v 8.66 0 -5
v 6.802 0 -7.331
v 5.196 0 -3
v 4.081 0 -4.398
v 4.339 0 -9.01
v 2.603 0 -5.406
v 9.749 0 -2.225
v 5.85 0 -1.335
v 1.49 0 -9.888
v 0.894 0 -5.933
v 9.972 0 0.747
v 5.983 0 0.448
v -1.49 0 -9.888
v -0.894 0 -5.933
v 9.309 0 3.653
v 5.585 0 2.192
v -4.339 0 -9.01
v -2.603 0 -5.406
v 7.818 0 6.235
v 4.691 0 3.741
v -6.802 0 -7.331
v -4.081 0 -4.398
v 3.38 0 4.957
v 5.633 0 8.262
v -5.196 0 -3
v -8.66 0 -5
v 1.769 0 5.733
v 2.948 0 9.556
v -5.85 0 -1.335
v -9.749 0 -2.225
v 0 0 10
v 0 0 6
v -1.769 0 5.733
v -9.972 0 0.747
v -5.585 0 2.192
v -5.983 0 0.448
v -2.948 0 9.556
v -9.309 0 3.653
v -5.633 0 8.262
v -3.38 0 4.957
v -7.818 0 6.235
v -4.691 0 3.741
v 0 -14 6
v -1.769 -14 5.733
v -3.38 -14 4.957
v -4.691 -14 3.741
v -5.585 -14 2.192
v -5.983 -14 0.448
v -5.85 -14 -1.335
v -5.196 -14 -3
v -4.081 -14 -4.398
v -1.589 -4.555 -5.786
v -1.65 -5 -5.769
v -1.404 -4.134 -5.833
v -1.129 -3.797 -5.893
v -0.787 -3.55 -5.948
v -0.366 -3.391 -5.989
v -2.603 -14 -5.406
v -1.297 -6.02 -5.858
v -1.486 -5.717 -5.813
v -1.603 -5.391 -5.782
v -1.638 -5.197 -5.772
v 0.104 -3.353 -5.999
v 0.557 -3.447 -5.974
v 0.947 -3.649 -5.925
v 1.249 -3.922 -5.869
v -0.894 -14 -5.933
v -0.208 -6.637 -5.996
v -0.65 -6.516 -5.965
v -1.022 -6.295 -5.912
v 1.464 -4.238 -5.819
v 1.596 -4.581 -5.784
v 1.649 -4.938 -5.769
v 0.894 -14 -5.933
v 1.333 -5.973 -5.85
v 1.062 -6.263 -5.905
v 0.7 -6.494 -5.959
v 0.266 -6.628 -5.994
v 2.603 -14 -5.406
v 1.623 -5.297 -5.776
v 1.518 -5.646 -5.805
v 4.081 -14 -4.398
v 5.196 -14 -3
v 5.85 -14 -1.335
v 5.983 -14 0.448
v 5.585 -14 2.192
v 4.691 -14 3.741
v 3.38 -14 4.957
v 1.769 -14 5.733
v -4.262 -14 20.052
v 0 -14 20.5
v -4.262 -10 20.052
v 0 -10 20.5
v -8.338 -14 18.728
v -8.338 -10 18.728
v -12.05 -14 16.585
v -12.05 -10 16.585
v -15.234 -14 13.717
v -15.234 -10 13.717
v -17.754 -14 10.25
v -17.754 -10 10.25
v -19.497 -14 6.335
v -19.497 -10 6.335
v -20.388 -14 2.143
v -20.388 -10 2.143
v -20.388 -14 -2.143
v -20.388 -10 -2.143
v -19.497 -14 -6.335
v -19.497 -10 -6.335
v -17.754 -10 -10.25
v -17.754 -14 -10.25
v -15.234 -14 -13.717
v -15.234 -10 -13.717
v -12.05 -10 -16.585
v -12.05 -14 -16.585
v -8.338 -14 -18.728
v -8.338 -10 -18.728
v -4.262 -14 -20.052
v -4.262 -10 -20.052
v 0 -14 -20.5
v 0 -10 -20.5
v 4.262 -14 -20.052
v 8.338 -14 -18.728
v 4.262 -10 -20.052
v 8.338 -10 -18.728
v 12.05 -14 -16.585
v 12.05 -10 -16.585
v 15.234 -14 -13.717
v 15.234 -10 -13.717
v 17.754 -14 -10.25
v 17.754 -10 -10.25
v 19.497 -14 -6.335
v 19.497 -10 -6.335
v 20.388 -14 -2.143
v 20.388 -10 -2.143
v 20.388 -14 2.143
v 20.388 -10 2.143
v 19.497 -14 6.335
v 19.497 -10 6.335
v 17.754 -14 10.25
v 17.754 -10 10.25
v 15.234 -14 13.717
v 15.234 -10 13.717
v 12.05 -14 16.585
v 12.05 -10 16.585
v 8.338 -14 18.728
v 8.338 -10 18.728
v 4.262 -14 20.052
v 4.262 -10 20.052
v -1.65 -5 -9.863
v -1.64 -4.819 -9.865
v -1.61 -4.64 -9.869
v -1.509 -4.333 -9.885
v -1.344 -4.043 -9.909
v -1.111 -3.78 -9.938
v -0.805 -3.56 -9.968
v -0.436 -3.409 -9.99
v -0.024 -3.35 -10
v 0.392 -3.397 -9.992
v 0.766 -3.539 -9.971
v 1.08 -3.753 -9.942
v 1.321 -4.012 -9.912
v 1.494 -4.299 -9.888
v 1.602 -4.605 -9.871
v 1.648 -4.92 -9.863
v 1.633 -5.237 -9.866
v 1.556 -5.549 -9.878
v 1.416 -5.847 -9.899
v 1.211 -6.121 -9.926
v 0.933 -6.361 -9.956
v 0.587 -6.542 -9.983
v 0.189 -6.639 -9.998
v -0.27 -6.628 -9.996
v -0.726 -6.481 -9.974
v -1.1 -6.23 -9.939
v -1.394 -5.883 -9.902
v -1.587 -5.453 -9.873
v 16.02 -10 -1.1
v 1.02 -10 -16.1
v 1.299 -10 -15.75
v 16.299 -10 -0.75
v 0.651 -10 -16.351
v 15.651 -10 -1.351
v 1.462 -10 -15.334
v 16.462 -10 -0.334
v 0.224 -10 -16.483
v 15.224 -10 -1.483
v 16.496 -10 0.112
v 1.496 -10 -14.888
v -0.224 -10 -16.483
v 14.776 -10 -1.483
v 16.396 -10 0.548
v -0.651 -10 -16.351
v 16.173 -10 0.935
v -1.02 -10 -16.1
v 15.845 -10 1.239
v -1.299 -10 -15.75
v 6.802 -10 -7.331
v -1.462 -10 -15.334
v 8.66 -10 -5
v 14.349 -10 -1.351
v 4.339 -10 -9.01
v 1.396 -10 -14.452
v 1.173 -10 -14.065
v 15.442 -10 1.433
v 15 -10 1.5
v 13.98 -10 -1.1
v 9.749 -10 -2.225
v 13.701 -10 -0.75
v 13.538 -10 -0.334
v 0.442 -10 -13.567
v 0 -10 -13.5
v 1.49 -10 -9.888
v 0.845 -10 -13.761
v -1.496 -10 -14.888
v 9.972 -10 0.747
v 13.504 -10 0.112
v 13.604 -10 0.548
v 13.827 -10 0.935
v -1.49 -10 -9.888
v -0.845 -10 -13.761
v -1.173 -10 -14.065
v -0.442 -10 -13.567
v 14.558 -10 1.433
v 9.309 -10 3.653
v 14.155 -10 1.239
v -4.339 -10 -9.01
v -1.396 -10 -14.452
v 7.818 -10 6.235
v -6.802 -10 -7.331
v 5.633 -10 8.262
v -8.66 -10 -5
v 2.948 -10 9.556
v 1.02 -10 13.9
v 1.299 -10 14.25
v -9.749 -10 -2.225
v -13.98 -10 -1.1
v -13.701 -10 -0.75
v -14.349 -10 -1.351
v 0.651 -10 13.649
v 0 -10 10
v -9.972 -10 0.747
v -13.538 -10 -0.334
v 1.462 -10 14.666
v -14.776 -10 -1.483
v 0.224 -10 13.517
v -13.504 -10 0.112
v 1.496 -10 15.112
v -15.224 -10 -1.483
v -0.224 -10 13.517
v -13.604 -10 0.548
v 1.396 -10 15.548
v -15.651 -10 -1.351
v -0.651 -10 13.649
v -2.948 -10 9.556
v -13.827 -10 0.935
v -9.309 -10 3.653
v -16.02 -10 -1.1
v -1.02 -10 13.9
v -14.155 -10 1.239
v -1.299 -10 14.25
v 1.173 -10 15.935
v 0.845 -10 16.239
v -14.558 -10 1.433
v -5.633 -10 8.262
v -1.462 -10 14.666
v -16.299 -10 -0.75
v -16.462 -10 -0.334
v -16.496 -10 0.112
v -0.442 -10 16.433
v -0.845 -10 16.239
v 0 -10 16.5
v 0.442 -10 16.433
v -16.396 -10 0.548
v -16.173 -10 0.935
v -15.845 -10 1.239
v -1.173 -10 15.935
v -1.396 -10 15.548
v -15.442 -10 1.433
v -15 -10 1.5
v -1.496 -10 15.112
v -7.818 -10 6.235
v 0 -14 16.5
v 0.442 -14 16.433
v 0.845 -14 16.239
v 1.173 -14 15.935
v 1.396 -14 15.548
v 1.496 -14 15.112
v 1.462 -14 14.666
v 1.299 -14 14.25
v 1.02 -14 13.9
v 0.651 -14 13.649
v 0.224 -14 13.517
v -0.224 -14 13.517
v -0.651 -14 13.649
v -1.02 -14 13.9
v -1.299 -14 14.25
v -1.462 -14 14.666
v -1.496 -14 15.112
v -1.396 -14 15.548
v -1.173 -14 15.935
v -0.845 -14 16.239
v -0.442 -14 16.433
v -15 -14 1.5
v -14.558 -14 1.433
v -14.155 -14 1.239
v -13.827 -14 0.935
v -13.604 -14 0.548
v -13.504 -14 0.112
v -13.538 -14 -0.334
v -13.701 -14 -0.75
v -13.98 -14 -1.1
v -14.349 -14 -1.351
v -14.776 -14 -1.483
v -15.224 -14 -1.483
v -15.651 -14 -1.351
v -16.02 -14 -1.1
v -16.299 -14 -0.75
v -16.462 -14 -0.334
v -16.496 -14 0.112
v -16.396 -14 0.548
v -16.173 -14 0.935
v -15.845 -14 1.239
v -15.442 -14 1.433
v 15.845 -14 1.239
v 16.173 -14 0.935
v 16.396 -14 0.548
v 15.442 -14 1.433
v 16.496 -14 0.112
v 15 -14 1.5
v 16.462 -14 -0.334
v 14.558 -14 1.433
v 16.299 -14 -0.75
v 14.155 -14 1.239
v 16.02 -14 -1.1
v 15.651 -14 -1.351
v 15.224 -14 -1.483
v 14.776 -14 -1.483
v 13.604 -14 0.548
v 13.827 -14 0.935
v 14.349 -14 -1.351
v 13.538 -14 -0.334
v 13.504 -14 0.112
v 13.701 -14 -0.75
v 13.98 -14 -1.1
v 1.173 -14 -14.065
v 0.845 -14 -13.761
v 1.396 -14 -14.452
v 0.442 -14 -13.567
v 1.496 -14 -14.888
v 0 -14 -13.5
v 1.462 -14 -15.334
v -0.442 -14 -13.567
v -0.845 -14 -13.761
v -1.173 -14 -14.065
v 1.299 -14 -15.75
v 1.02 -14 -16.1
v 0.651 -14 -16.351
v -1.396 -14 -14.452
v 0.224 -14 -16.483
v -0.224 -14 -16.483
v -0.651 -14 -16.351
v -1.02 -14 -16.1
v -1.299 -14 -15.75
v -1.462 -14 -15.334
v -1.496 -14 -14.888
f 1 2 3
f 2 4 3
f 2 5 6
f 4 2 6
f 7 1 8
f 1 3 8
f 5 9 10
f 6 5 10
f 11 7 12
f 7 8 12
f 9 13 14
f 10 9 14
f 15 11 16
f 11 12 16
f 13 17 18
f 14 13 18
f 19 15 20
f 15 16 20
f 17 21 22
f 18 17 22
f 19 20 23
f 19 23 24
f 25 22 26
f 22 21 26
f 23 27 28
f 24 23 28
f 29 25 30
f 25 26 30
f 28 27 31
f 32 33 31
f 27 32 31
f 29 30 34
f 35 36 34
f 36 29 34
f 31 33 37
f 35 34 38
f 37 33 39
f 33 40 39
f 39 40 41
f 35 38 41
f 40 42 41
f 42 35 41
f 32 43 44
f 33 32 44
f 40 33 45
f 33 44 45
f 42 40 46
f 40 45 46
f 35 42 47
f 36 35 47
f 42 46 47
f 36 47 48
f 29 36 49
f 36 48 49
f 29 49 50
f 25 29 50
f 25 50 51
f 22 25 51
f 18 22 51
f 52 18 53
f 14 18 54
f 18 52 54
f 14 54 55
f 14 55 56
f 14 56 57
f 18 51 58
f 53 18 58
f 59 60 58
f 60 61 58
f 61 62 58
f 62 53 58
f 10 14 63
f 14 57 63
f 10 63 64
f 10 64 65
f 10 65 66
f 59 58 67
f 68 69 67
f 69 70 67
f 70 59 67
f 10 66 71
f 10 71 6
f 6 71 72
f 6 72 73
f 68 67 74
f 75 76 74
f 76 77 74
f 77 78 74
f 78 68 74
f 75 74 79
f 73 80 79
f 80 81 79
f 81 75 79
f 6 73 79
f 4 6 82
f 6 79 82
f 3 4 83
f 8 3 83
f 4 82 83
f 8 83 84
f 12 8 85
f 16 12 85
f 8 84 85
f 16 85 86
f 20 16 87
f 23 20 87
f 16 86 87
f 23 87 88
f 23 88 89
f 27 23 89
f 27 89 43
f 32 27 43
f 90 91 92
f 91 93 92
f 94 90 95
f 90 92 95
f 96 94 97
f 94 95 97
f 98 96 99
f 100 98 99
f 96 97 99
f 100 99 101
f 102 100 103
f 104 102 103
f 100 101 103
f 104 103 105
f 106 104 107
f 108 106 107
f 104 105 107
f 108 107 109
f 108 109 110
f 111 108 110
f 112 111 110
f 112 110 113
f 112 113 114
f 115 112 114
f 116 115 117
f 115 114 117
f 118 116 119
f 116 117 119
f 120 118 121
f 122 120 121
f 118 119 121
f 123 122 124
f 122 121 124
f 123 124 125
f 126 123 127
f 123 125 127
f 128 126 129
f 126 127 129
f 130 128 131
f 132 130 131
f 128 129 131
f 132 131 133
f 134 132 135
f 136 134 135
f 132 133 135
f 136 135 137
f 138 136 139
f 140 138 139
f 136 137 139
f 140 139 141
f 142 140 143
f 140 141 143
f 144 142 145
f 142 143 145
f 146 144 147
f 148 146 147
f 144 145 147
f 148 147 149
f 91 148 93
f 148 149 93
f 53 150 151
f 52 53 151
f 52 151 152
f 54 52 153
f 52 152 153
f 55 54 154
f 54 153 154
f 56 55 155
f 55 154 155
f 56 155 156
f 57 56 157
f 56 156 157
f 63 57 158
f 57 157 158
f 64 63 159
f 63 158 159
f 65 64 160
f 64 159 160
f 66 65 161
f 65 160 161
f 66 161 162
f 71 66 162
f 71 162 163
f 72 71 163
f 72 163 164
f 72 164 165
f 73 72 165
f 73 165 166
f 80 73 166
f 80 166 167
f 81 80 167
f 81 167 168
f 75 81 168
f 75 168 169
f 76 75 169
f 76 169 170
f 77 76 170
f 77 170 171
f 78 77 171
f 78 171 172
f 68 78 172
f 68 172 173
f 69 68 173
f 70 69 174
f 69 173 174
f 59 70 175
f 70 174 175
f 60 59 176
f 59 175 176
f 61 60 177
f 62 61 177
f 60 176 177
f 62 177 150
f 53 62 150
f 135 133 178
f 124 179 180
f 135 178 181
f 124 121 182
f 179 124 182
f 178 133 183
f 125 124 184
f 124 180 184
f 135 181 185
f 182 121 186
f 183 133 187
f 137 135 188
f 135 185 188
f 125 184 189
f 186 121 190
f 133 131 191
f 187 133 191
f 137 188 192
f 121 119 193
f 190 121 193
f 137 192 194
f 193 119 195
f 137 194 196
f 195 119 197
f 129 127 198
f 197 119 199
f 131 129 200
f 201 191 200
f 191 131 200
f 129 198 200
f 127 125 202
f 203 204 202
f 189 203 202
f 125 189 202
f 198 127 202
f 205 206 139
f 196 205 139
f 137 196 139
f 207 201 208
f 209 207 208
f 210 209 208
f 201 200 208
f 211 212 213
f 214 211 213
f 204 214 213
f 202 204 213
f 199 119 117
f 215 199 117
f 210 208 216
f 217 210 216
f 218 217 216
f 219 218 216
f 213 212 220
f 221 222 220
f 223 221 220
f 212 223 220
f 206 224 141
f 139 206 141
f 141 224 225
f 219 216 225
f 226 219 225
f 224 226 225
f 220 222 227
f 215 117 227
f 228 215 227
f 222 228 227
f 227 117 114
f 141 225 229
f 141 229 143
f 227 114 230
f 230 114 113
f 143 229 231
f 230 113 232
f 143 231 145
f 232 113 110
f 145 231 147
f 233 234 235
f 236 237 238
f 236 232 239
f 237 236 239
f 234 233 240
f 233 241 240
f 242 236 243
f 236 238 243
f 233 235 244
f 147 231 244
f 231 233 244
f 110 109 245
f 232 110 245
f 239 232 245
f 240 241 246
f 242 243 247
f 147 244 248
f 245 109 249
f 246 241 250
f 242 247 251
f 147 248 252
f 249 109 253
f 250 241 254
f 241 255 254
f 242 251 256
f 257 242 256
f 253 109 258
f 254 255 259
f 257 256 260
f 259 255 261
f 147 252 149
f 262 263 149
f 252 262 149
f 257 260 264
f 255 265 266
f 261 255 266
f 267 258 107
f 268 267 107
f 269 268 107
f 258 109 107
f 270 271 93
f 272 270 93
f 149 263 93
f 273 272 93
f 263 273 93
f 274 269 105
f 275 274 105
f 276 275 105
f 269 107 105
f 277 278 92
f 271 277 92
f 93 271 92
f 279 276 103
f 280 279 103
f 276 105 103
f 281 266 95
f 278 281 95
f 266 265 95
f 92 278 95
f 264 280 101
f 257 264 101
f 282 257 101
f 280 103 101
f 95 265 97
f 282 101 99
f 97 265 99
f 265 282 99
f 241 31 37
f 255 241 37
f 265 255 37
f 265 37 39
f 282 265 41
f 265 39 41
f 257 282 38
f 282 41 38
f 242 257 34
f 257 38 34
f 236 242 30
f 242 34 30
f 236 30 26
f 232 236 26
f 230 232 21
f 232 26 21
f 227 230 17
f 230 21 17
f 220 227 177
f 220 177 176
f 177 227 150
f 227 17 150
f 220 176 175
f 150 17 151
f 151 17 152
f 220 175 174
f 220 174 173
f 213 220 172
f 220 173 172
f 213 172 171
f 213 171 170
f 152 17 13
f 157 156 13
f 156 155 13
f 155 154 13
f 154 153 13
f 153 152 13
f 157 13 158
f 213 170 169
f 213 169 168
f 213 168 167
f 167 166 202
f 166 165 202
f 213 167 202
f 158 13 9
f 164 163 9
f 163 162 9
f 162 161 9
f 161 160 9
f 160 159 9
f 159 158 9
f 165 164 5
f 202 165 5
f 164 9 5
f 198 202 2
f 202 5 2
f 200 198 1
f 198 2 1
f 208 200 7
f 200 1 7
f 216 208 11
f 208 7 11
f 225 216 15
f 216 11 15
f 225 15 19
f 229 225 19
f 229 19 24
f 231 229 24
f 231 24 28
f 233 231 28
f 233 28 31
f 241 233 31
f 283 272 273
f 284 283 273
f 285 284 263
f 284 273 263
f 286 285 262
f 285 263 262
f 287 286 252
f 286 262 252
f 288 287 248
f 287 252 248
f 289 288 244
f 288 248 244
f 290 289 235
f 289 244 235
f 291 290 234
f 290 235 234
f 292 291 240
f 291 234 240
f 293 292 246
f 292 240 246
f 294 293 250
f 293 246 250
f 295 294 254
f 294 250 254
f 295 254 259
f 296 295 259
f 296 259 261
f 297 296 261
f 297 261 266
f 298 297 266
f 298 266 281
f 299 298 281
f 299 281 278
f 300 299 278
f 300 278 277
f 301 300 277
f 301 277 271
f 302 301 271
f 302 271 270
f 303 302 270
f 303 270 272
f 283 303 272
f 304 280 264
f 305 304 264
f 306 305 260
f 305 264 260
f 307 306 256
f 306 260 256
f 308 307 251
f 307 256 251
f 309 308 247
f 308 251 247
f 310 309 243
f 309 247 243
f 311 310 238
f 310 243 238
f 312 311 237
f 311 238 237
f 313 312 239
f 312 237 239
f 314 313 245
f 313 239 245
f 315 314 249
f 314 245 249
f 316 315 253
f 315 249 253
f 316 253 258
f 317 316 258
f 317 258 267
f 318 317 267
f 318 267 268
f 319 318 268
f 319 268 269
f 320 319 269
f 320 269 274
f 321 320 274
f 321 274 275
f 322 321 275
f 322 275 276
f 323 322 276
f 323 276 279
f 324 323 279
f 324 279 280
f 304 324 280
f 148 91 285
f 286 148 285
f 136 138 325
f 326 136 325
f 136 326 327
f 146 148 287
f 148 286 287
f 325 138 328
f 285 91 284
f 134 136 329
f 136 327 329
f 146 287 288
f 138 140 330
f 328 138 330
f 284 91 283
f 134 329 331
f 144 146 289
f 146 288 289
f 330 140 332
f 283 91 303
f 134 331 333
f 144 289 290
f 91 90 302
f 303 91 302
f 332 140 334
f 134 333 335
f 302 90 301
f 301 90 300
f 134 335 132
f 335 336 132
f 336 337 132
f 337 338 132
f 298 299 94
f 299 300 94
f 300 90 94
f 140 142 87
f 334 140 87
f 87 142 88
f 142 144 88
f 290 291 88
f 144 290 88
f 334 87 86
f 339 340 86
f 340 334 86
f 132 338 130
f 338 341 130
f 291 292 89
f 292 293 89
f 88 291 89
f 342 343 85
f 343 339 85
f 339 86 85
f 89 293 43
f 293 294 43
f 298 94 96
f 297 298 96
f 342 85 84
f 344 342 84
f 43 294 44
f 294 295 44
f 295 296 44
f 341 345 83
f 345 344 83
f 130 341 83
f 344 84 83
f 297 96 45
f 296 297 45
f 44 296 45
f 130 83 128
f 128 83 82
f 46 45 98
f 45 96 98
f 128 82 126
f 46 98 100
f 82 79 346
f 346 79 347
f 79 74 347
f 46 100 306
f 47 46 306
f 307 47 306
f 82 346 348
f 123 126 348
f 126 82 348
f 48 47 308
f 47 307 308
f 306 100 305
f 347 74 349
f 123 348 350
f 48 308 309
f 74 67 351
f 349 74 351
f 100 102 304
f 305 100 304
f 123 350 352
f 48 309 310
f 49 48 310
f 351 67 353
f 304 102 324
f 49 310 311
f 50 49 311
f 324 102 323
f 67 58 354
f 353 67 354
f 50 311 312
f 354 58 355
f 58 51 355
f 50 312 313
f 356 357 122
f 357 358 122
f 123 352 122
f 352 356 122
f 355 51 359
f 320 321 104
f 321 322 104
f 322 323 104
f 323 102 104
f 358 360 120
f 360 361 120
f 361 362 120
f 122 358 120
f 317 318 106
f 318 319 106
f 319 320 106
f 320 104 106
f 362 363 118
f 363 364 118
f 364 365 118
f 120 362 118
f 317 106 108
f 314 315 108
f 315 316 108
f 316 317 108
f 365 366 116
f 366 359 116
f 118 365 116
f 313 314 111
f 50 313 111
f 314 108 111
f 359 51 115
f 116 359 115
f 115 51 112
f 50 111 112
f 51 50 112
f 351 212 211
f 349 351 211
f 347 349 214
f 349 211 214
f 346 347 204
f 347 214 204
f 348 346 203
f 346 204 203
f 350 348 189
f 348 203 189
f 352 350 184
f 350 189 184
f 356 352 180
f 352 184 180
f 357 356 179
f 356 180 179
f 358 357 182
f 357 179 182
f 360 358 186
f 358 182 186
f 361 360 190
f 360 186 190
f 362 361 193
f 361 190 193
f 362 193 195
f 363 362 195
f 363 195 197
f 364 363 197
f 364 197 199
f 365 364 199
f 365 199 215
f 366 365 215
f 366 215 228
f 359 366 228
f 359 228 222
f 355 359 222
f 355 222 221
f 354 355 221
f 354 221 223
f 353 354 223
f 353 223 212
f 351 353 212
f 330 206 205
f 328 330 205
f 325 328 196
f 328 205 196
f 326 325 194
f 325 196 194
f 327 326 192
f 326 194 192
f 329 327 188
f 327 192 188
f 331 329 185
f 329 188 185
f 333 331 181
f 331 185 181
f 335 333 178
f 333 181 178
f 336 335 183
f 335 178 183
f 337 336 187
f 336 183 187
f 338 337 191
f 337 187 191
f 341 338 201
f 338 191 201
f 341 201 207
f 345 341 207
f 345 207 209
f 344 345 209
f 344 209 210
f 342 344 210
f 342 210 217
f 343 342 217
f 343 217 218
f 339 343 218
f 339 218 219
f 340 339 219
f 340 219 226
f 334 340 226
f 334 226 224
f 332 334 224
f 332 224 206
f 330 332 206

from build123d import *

# Parameters (mm, degrees)
CUT_EXTRUDE1_REACH     = 32.668
SKETCH4_R              = 1.5
M4_TAPPED_HOLE1_REACH  = 39.835
M4_TAPPED_HOLE1_BORE_R = 1.65


with BuildPart() as part:
    # Sketch1 → Revolve1 (revolve)
    with BuildSketch(Plane(origin=(0, 0, 0), x_dir=(0, 0, -1), z_dir=(1, 0, 0)), mode=Mode.PRIVATE) as revolve1_sk:
        Polygon((6, 0), (6, -14), (20.5, -14), (20.5, -10), (10, -10), (10, 0), align=None)
    revolve(revolve1_sk.sketch.rotate(Axis((0, 12.462470437, 0), (0, -1, 0)), 180), axis=Axis((0, 12.462470437, 0), (0, -1, 0)))

    # Sketch4 → Cut-Extrude1 (cut, up to next)
    with BuildSketch(Plane(origin=(0, -10, 0), x_dir=(1, 0, 0), z_dir=(0, 1, 0)), mode=Mode.PRIVATE) as cut_extrude1_sk1:
        with Locations(Location((0, 15, 0), (0, 0, 270))):
            Circle(SKETCH4_R)
    cut_extrude1_tool1 = extrude(cut_extrude1_sk1.sketch, amount=-CUT_EXTRUDE1_REACH, mode=Mode.PRIVATE) & part.part
    # Sketch4 → Cut-Extrude1 (cut, up to next)
    with BuildSketch(Plane(origin=(0, -10, 0), x_dir=(1, 0, 0), z_dir=(0, 1, 0)), mode=Mode.PRIVATE) as cut_extrude1_sk2:
        with Locations(Location((15, 0, 0), (0, 0, 270))):
            Circle(SKETCH4_R)
    cut_extrude1_tool2 = extrude(cut_extrude1_sk2.sketch, amount=-CUT_EXTRUDE1_REACH, mode=Mode.PRIVATE) & part.part
    # Sketch4 → Cut-Extrude1 (cut, up to next)
    with BuildSketch(Plane(origin=(0, -10, 0), x_dir=(1, 0, 0), z_dir=(0, 1, 0)), mode=Mode.PRIVATE) as cut_extrude1_sk3:
        with Locations(Location((0, -15, 0), (0, 0, 270))):
            Circle(SKETCH4_R)
    cut_extrude1_tool3 = extrude(cut_extrude1_sk3.sketch, amount=-CUT_EXTRUDE1_REACH, mode=Mode.PRIVATE) & part.part
    # Sketch4 → Cut-Extrude1 (cut, up to next)
    with BuildSketch(Plane(origin=(0, -10, 0), x_dir=(1, 0, 0), z_dir=(0, 1, 0)), mode=Mode.PRIVATE) as cut_extrude1_sk4:
        with Locations(Location((-15, 0, 0), (0, 0, 270))):
            Circle(SKETCH4_R)
    cut_extrude1_tool4 = extrude(cut_extrude1_sk4.sketch, amount=-CUT_EXTRUDE1_REACH, mode=Mode.PRIVATE) & part.part
    add(cut_extrude1_tool1.solids().sort_by_distance((0, -10, -15))[0], mode=Mode.SUBTRACT)
    add(cut_extrude1_tool2.solids().sort_by_distance((15, -10, 0))[0], mode=Mode.SUBTRACT)
    add(cut_extrude1_tool3.solids().sort_by_distance((0, -10, 15))[0], mode=Mode.SUBTRACT)
    add(cut_extrude1_tool4.solids().sort_by_distance((-15, -10, 0))[0], mode=Mode.SUBTRACT)

    # M4 Tapped Hole1 bore (on position points) → M4 Tapped Hole1 (cut, up to next)
    with BuildSketch(Plane(origin=(0, -5, -10), x_dir=(-1, 0, 0), z_dir=(0, 0, -1)), mode=Mode.PRIVATE) as m4_tapped_hole1_sk1:
        Circle(M4_TAPPED_HOLE1_BORE_R)
    m4_tapped_hole1_tool1 = extrude(m4_tapped_hole1_sk1.sketch, amount=-M4_TAPPED_HOLE1_REACH, mode=Mode.PRIVATE) & part.part
    add(m4_tapped_hole1_tool1.solids().sort_by_distance((0, -5, -10))[0], mode=Mode.SUBTRACT)


solid = part.part
